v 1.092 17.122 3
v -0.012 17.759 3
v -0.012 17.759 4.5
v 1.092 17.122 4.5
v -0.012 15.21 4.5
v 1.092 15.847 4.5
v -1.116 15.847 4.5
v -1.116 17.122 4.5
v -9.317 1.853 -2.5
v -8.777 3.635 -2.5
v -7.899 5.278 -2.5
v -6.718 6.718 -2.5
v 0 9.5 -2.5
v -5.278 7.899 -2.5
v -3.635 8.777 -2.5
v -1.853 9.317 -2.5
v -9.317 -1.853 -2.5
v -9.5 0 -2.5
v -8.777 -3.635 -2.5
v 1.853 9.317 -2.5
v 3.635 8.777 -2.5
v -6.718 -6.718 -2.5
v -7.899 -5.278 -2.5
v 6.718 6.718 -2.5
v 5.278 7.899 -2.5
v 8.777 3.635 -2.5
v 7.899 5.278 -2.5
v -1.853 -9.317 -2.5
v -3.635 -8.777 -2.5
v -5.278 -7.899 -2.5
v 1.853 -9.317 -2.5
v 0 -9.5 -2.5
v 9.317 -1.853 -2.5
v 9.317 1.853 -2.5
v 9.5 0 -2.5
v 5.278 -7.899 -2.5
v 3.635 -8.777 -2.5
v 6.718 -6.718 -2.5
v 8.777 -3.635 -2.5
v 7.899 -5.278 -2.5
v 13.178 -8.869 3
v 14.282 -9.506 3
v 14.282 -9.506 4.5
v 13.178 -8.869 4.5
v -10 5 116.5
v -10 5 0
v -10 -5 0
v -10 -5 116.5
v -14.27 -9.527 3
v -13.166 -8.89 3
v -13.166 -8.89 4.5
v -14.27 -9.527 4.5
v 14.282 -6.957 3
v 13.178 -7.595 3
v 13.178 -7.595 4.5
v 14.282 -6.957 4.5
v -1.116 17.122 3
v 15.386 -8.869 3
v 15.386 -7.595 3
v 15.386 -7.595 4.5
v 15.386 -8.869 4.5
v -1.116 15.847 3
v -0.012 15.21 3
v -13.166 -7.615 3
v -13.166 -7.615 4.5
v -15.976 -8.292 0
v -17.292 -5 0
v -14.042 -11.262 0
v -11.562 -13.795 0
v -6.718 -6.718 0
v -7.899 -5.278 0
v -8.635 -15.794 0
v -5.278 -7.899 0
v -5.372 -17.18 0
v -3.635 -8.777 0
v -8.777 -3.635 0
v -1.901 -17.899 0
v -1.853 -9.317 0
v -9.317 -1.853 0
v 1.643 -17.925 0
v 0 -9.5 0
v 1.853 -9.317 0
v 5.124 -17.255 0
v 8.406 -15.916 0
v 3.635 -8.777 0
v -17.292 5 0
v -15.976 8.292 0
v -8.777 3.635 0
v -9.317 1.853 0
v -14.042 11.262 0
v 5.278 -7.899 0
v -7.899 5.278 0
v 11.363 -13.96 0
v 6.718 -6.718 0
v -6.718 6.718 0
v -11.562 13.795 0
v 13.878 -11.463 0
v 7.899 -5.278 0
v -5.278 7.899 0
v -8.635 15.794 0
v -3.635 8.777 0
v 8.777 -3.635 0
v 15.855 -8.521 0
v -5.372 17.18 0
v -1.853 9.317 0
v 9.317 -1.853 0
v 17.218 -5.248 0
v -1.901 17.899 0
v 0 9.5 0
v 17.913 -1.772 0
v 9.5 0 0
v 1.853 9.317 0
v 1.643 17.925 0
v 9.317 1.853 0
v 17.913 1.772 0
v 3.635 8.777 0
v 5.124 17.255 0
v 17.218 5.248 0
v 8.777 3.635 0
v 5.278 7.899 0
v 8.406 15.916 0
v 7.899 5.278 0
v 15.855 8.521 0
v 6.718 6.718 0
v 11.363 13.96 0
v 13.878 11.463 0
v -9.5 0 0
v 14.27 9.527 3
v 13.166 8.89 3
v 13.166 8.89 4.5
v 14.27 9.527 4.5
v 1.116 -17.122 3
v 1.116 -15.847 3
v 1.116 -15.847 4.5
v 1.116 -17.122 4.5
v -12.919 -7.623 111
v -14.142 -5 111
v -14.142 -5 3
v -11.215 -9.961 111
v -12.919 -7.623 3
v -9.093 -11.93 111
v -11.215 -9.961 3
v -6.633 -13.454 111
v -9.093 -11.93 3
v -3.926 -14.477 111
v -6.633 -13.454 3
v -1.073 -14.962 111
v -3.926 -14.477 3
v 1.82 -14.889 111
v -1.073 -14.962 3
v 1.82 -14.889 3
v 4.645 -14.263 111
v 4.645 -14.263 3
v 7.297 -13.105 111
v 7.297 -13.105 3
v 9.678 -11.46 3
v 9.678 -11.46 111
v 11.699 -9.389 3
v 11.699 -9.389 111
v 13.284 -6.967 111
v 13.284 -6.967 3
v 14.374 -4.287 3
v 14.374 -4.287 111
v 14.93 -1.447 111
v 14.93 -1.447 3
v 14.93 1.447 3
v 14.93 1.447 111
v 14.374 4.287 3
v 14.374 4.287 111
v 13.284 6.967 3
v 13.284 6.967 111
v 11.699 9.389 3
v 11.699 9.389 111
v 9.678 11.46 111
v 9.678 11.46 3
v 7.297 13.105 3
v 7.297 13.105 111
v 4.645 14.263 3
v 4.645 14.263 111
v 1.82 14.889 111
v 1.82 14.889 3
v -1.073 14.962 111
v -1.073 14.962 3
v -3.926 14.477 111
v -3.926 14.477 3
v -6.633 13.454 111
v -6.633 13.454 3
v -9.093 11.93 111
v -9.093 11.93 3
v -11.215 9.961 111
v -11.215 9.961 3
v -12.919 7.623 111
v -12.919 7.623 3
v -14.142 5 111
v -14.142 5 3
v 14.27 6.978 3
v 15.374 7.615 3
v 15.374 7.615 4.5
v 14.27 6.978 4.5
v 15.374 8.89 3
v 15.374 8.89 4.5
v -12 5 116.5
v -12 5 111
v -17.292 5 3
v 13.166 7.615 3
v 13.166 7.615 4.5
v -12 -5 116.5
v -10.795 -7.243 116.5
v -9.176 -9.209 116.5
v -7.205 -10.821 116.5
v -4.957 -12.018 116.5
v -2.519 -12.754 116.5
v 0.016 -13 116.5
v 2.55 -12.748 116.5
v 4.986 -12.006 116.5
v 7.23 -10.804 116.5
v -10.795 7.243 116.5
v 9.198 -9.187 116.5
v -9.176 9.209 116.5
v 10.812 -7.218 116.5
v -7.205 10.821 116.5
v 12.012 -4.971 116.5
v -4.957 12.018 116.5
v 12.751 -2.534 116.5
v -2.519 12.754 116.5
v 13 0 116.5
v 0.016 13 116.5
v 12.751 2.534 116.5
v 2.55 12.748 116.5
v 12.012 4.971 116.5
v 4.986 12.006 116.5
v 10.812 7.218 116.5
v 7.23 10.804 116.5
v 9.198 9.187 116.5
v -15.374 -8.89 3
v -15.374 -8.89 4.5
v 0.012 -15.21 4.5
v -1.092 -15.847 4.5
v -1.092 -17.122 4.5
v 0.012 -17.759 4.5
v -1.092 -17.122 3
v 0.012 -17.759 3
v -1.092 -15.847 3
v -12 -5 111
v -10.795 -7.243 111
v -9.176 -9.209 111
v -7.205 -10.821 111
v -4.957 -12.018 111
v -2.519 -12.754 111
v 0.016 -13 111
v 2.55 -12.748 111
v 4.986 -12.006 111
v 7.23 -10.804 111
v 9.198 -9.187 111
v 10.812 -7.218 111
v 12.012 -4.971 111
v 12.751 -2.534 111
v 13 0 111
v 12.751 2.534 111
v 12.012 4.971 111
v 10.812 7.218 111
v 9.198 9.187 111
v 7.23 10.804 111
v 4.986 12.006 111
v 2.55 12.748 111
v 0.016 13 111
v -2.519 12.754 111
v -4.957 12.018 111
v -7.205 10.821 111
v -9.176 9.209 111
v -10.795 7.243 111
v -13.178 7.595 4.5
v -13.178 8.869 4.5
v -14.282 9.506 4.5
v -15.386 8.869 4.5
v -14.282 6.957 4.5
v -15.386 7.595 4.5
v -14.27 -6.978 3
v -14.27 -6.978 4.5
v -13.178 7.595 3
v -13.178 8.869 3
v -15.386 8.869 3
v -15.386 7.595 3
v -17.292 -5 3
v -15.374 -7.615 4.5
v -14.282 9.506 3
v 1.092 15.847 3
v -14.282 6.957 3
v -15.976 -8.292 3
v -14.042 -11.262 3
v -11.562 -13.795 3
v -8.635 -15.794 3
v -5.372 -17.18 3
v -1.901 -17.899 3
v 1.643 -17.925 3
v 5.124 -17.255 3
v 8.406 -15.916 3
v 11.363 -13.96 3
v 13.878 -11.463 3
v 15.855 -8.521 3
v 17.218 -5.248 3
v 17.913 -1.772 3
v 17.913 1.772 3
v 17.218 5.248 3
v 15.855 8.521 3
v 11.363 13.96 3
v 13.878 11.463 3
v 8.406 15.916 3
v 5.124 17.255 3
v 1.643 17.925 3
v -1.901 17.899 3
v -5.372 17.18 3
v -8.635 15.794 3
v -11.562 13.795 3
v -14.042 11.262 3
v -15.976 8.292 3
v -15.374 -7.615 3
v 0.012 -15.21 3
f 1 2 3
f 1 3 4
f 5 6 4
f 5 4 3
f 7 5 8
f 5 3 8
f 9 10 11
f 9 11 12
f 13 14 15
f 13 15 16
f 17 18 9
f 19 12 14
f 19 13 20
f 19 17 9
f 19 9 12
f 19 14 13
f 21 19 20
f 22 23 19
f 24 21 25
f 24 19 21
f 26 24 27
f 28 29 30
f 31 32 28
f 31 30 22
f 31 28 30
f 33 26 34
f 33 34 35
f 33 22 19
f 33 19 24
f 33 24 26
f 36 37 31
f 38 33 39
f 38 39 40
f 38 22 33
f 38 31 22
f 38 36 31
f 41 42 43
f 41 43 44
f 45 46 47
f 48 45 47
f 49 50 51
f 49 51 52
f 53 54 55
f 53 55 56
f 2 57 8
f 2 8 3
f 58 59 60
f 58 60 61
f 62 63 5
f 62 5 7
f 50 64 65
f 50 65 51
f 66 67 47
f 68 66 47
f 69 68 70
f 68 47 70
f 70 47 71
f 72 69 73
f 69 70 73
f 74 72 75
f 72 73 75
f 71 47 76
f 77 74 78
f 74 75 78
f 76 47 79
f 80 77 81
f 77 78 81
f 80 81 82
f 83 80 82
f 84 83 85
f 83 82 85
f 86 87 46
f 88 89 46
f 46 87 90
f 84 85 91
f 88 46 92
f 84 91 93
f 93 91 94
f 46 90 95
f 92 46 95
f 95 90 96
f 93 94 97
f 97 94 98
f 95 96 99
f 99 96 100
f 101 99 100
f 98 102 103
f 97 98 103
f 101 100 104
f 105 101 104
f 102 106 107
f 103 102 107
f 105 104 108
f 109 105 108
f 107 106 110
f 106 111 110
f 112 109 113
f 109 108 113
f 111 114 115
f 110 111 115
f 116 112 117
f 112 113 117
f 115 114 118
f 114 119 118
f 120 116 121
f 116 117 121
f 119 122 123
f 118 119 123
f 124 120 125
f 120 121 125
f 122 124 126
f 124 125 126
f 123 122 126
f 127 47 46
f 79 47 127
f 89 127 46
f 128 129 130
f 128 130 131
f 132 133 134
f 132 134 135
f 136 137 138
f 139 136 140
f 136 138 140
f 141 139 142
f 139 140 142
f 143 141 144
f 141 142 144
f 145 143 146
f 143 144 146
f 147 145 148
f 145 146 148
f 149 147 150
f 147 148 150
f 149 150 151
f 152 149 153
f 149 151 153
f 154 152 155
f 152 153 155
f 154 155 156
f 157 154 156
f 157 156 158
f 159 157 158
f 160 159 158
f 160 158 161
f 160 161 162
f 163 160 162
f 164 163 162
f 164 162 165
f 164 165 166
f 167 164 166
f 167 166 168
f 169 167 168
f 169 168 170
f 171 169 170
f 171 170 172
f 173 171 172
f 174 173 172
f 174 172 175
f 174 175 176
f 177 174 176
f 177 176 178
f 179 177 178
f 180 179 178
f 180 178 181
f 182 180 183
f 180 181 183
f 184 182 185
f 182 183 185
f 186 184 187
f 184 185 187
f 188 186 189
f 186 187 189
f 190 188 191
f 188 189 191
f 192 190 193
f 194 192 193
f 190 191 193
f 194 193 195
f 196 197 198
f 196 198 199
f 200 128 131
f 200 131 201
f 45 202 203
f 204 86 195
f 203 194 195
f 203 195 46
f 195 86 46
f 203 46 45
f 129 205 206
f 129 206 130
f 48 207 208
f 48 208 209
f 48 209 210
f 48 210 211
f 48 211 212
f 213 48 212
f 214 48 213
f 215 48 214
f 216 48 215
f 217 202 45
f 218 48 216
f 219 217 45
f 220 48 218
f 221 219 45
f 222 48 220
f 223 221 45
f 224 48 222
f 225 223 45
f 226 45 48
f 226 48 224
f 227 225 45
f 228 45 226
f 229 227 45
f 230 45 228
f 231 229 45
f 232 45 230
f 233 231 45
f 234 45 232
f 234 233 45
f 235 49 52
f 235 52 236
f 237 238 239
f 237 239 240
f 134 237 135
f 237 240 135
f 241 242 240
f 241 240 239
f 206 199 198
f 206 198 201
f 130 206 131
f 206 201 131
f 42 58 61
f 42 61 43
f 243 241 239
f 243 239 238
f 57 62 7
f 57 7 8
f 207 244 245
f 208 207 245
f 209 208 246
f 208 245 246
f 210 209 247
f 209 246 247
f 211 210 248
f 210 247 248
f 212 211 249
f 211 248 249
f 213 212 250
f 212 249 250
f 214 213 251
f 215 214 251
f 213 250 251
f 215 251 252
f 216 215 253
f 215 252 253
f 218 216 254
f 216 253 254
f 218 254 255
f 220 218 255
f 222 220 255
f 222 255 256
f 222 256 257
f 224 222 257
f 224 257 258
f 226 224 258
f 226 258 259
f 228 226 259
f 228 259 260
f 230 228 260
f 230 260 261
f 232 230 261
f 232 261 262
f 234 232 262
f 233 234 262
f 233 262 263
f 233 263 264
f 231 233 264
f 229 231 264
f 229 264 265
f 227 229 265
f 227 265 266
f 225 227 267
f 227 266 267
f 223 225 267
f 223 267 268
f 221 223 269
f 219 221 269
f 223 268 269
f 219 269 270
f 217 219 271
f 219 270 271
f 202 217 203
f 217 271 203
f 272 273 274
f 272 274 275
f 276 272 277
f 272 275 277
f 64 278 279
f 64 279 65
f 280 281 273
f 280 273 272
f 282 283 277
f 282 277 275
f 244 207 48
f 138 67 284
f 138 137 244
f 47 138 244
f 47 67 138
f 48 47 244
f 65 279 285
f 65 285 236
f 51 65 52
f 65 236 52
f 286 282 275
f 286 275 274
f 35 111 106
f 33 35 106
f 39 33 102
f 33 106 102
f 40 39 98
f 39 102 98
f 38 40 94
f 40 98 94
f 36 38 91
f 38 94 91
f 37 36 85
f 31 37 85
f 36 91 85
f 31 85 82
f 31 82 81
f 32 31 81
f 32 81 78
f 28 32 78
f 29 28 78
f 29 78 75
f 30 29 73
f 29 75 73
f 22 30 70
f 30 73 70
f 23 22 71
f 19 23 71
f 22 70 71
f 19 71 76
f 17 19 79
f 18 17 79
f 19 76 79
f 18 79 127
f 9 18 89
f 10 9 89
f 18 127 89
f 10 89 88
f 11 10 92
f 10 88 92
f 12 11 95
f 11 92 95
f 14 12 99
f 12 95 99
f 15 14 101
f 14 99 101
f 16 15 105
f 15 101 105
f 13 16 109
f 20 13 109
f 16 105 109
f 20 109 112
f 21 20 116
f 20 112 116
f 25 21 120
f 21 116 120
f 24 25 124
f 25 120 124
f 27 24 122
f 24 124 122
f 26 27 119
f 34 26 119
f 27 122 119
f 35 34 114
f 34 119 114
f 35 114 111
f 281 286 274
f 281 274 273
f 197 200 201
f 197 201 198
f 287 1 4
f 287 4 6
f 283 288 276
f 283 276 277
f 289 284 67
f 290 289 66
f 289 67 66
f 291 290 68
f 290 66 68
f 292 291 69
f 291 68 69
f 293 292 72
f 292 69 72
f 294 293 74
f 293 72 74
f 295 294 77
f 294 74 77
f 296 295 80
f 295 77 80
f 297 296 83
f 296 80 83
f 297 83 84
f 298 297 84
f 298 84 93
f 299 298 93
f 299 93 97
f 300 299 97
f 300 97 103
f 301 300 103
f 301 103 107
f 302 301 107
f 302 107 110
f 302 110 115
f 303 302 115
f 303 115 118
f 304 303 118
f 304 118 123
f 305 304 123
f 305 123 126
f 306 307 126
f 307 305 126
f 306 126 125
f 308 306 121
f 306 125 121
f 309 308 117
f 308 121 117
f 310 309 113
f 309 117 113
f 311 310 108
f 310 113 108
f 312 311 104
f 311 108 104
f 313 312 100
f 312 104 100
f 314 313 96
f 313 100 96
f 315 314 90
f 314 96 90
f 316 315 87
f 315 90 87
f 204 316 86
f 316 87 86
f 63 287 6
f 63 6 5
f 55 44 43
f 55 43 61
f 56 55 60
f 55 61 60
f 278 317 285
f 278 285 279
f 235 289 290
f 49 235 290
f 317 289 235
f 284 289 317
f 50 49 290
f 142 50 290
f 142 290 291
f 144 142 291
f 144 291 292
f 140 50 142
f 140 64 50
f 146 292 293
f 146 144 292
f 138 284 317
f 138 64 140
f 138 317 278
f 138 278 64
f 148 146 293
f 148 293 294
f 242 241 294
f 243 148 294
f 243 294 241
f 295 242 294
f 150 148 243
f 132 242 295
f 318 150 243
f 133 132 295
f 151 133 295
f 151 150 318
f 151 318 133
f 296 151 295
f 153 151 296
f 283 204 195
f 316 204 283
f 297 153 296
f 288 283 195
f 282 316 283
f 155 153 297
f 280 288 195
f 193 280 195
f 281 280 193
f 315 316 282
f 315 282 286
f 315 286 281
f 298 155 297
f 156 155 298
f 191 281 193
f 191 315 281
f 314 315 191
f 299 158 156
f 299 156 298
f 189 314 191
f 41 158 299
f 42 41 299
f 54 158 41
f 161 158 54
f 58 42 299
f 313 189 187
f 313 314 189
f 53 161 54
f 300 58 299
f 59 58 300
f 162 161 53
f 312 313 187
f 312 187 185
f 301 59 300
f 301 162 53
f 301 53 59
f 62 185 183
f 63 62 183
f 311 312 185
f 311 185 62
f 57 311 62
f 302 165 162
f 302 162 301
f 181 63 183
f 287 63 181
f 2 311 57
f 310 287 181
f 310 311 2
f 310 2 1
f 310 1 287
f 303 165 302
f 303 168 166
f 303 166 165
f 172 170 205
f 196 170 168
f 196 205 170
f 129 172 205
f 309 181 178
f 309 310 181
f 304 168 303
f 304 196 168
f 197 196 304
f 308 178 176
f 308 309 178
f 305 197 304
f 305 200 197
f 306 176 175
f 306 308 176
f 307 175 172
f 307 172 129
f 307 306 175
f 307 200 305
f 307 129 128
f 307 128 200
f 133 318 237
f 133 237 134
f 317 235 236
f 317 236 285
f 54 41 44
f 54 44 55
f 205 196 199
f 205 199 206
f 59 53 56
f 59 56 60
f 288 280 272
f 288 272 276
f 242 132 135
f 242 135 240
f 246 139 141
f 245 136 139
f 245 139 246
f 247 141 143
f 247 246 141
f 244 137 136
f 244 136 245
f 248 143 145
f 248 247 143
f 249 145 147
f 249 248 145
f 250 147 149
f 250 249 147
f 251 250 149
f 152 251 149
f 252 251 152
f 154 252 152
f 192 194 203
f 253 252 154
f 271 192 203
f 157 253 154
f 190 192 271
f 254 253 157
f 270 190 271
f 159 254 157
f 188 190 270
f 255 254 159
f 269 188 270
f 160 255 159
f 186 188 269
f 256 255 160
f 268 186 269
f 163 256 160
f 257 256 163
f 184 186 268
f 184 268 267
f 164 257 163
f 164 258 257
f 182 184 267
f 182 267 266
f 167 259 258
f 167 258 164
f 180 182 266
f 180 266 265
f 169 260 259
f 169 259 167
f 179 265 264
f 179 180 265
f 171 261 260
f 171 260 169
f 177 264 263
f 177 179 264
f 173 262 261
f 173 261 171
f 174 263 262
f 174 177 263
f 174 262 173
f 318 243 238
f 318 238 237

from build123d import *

# Parameters (mm, degrees)
SKETCH_R           = 18
PAD_DEPTH          = 3
SKETCH001_R        = 15
PAD001_DEPTH       = 108
SKETCH002_R        = 9.5
PAD002_DEPTH       = 2.5
SKETCH003_R        = 13
PAD003_DEPTH       = 5.5
PAD004_DEPTH       = 1.5
POLARPATTERN_COUNT = 6
SKETCH009_W        = 8
SKETCH009_H        = 10
POCKET_DEPTH       = 118


with BuildPart() as part:
    # Sketch → Pad (new body)
    with BuildSketch(Plane.XY):
        Circle(SKETCH_R)
    extrude(amount=PAD_DEPTH)

    # Sketch001 (on Face3 of Pad) → Pad001 (join)
    with BuildSketch(Plane.XY.offset(3)):
        Circle(SKETCH001_R)
    extrude(amount=PAD001_DEPTH)

    # Sketch002 (on Face2 of Pad001) → Pad002 (join)
    with BuildSketch(Plane(origin=(0, 0, 0), x_dir=(1, 0, 0), z_dir=(0, 0, -1))):
        Circle(SKETCH002_R)
    extrude(amount=PAD002_DEPTH)

    # Sketch003 (on Face7 of Pad002) → Pad003 (join)
    with BuildSketch(Plane.XY.offset(111)):
        Circle(SKETCH003_R)
    extrude(amount=PAD003_DEPTH)

    # Sketch008 (on Face3 of Pad003) → Pad004 (join)
    with BuildSketch(Plane.XY.offset(3)):
        Polygon((-1.11579, 17.121659), (-0.012041, 17.758909), (1.091708, 17.121659), (1.091708, 15.84716), (-0.012041, 15.209911), (-1.11579, 15.84716), align=None)
    pad004 = extrude(amount=PAD004_DEPTH)

    # PolarPattern: Pad004 ×6 about axis
    polarpattern_axis = Axis((0, 0, 3), (0, 0, 1))
    for i in range(1, POLARPATTERN_COUNT):
        add(pad004.rotate(polarpattern_axis, i * 360 / POLARPATTERN_COUNT))

    # Sketch009 (on Face2 of PolarPattern) → Pocket (cut)
    with BuildSketch(Plane(origin=(0, 0, 0), x_dir=(1, 0, 0), z_dir=(0, 0, -1))):
        with Locations((-14, 0)):
            Rectangle(SKETCH009_W, SKETCH009_H)
    extrude(amount=-POCKET_DEPTH, mode=Mode.SUBTRACT)


solid = part.part
